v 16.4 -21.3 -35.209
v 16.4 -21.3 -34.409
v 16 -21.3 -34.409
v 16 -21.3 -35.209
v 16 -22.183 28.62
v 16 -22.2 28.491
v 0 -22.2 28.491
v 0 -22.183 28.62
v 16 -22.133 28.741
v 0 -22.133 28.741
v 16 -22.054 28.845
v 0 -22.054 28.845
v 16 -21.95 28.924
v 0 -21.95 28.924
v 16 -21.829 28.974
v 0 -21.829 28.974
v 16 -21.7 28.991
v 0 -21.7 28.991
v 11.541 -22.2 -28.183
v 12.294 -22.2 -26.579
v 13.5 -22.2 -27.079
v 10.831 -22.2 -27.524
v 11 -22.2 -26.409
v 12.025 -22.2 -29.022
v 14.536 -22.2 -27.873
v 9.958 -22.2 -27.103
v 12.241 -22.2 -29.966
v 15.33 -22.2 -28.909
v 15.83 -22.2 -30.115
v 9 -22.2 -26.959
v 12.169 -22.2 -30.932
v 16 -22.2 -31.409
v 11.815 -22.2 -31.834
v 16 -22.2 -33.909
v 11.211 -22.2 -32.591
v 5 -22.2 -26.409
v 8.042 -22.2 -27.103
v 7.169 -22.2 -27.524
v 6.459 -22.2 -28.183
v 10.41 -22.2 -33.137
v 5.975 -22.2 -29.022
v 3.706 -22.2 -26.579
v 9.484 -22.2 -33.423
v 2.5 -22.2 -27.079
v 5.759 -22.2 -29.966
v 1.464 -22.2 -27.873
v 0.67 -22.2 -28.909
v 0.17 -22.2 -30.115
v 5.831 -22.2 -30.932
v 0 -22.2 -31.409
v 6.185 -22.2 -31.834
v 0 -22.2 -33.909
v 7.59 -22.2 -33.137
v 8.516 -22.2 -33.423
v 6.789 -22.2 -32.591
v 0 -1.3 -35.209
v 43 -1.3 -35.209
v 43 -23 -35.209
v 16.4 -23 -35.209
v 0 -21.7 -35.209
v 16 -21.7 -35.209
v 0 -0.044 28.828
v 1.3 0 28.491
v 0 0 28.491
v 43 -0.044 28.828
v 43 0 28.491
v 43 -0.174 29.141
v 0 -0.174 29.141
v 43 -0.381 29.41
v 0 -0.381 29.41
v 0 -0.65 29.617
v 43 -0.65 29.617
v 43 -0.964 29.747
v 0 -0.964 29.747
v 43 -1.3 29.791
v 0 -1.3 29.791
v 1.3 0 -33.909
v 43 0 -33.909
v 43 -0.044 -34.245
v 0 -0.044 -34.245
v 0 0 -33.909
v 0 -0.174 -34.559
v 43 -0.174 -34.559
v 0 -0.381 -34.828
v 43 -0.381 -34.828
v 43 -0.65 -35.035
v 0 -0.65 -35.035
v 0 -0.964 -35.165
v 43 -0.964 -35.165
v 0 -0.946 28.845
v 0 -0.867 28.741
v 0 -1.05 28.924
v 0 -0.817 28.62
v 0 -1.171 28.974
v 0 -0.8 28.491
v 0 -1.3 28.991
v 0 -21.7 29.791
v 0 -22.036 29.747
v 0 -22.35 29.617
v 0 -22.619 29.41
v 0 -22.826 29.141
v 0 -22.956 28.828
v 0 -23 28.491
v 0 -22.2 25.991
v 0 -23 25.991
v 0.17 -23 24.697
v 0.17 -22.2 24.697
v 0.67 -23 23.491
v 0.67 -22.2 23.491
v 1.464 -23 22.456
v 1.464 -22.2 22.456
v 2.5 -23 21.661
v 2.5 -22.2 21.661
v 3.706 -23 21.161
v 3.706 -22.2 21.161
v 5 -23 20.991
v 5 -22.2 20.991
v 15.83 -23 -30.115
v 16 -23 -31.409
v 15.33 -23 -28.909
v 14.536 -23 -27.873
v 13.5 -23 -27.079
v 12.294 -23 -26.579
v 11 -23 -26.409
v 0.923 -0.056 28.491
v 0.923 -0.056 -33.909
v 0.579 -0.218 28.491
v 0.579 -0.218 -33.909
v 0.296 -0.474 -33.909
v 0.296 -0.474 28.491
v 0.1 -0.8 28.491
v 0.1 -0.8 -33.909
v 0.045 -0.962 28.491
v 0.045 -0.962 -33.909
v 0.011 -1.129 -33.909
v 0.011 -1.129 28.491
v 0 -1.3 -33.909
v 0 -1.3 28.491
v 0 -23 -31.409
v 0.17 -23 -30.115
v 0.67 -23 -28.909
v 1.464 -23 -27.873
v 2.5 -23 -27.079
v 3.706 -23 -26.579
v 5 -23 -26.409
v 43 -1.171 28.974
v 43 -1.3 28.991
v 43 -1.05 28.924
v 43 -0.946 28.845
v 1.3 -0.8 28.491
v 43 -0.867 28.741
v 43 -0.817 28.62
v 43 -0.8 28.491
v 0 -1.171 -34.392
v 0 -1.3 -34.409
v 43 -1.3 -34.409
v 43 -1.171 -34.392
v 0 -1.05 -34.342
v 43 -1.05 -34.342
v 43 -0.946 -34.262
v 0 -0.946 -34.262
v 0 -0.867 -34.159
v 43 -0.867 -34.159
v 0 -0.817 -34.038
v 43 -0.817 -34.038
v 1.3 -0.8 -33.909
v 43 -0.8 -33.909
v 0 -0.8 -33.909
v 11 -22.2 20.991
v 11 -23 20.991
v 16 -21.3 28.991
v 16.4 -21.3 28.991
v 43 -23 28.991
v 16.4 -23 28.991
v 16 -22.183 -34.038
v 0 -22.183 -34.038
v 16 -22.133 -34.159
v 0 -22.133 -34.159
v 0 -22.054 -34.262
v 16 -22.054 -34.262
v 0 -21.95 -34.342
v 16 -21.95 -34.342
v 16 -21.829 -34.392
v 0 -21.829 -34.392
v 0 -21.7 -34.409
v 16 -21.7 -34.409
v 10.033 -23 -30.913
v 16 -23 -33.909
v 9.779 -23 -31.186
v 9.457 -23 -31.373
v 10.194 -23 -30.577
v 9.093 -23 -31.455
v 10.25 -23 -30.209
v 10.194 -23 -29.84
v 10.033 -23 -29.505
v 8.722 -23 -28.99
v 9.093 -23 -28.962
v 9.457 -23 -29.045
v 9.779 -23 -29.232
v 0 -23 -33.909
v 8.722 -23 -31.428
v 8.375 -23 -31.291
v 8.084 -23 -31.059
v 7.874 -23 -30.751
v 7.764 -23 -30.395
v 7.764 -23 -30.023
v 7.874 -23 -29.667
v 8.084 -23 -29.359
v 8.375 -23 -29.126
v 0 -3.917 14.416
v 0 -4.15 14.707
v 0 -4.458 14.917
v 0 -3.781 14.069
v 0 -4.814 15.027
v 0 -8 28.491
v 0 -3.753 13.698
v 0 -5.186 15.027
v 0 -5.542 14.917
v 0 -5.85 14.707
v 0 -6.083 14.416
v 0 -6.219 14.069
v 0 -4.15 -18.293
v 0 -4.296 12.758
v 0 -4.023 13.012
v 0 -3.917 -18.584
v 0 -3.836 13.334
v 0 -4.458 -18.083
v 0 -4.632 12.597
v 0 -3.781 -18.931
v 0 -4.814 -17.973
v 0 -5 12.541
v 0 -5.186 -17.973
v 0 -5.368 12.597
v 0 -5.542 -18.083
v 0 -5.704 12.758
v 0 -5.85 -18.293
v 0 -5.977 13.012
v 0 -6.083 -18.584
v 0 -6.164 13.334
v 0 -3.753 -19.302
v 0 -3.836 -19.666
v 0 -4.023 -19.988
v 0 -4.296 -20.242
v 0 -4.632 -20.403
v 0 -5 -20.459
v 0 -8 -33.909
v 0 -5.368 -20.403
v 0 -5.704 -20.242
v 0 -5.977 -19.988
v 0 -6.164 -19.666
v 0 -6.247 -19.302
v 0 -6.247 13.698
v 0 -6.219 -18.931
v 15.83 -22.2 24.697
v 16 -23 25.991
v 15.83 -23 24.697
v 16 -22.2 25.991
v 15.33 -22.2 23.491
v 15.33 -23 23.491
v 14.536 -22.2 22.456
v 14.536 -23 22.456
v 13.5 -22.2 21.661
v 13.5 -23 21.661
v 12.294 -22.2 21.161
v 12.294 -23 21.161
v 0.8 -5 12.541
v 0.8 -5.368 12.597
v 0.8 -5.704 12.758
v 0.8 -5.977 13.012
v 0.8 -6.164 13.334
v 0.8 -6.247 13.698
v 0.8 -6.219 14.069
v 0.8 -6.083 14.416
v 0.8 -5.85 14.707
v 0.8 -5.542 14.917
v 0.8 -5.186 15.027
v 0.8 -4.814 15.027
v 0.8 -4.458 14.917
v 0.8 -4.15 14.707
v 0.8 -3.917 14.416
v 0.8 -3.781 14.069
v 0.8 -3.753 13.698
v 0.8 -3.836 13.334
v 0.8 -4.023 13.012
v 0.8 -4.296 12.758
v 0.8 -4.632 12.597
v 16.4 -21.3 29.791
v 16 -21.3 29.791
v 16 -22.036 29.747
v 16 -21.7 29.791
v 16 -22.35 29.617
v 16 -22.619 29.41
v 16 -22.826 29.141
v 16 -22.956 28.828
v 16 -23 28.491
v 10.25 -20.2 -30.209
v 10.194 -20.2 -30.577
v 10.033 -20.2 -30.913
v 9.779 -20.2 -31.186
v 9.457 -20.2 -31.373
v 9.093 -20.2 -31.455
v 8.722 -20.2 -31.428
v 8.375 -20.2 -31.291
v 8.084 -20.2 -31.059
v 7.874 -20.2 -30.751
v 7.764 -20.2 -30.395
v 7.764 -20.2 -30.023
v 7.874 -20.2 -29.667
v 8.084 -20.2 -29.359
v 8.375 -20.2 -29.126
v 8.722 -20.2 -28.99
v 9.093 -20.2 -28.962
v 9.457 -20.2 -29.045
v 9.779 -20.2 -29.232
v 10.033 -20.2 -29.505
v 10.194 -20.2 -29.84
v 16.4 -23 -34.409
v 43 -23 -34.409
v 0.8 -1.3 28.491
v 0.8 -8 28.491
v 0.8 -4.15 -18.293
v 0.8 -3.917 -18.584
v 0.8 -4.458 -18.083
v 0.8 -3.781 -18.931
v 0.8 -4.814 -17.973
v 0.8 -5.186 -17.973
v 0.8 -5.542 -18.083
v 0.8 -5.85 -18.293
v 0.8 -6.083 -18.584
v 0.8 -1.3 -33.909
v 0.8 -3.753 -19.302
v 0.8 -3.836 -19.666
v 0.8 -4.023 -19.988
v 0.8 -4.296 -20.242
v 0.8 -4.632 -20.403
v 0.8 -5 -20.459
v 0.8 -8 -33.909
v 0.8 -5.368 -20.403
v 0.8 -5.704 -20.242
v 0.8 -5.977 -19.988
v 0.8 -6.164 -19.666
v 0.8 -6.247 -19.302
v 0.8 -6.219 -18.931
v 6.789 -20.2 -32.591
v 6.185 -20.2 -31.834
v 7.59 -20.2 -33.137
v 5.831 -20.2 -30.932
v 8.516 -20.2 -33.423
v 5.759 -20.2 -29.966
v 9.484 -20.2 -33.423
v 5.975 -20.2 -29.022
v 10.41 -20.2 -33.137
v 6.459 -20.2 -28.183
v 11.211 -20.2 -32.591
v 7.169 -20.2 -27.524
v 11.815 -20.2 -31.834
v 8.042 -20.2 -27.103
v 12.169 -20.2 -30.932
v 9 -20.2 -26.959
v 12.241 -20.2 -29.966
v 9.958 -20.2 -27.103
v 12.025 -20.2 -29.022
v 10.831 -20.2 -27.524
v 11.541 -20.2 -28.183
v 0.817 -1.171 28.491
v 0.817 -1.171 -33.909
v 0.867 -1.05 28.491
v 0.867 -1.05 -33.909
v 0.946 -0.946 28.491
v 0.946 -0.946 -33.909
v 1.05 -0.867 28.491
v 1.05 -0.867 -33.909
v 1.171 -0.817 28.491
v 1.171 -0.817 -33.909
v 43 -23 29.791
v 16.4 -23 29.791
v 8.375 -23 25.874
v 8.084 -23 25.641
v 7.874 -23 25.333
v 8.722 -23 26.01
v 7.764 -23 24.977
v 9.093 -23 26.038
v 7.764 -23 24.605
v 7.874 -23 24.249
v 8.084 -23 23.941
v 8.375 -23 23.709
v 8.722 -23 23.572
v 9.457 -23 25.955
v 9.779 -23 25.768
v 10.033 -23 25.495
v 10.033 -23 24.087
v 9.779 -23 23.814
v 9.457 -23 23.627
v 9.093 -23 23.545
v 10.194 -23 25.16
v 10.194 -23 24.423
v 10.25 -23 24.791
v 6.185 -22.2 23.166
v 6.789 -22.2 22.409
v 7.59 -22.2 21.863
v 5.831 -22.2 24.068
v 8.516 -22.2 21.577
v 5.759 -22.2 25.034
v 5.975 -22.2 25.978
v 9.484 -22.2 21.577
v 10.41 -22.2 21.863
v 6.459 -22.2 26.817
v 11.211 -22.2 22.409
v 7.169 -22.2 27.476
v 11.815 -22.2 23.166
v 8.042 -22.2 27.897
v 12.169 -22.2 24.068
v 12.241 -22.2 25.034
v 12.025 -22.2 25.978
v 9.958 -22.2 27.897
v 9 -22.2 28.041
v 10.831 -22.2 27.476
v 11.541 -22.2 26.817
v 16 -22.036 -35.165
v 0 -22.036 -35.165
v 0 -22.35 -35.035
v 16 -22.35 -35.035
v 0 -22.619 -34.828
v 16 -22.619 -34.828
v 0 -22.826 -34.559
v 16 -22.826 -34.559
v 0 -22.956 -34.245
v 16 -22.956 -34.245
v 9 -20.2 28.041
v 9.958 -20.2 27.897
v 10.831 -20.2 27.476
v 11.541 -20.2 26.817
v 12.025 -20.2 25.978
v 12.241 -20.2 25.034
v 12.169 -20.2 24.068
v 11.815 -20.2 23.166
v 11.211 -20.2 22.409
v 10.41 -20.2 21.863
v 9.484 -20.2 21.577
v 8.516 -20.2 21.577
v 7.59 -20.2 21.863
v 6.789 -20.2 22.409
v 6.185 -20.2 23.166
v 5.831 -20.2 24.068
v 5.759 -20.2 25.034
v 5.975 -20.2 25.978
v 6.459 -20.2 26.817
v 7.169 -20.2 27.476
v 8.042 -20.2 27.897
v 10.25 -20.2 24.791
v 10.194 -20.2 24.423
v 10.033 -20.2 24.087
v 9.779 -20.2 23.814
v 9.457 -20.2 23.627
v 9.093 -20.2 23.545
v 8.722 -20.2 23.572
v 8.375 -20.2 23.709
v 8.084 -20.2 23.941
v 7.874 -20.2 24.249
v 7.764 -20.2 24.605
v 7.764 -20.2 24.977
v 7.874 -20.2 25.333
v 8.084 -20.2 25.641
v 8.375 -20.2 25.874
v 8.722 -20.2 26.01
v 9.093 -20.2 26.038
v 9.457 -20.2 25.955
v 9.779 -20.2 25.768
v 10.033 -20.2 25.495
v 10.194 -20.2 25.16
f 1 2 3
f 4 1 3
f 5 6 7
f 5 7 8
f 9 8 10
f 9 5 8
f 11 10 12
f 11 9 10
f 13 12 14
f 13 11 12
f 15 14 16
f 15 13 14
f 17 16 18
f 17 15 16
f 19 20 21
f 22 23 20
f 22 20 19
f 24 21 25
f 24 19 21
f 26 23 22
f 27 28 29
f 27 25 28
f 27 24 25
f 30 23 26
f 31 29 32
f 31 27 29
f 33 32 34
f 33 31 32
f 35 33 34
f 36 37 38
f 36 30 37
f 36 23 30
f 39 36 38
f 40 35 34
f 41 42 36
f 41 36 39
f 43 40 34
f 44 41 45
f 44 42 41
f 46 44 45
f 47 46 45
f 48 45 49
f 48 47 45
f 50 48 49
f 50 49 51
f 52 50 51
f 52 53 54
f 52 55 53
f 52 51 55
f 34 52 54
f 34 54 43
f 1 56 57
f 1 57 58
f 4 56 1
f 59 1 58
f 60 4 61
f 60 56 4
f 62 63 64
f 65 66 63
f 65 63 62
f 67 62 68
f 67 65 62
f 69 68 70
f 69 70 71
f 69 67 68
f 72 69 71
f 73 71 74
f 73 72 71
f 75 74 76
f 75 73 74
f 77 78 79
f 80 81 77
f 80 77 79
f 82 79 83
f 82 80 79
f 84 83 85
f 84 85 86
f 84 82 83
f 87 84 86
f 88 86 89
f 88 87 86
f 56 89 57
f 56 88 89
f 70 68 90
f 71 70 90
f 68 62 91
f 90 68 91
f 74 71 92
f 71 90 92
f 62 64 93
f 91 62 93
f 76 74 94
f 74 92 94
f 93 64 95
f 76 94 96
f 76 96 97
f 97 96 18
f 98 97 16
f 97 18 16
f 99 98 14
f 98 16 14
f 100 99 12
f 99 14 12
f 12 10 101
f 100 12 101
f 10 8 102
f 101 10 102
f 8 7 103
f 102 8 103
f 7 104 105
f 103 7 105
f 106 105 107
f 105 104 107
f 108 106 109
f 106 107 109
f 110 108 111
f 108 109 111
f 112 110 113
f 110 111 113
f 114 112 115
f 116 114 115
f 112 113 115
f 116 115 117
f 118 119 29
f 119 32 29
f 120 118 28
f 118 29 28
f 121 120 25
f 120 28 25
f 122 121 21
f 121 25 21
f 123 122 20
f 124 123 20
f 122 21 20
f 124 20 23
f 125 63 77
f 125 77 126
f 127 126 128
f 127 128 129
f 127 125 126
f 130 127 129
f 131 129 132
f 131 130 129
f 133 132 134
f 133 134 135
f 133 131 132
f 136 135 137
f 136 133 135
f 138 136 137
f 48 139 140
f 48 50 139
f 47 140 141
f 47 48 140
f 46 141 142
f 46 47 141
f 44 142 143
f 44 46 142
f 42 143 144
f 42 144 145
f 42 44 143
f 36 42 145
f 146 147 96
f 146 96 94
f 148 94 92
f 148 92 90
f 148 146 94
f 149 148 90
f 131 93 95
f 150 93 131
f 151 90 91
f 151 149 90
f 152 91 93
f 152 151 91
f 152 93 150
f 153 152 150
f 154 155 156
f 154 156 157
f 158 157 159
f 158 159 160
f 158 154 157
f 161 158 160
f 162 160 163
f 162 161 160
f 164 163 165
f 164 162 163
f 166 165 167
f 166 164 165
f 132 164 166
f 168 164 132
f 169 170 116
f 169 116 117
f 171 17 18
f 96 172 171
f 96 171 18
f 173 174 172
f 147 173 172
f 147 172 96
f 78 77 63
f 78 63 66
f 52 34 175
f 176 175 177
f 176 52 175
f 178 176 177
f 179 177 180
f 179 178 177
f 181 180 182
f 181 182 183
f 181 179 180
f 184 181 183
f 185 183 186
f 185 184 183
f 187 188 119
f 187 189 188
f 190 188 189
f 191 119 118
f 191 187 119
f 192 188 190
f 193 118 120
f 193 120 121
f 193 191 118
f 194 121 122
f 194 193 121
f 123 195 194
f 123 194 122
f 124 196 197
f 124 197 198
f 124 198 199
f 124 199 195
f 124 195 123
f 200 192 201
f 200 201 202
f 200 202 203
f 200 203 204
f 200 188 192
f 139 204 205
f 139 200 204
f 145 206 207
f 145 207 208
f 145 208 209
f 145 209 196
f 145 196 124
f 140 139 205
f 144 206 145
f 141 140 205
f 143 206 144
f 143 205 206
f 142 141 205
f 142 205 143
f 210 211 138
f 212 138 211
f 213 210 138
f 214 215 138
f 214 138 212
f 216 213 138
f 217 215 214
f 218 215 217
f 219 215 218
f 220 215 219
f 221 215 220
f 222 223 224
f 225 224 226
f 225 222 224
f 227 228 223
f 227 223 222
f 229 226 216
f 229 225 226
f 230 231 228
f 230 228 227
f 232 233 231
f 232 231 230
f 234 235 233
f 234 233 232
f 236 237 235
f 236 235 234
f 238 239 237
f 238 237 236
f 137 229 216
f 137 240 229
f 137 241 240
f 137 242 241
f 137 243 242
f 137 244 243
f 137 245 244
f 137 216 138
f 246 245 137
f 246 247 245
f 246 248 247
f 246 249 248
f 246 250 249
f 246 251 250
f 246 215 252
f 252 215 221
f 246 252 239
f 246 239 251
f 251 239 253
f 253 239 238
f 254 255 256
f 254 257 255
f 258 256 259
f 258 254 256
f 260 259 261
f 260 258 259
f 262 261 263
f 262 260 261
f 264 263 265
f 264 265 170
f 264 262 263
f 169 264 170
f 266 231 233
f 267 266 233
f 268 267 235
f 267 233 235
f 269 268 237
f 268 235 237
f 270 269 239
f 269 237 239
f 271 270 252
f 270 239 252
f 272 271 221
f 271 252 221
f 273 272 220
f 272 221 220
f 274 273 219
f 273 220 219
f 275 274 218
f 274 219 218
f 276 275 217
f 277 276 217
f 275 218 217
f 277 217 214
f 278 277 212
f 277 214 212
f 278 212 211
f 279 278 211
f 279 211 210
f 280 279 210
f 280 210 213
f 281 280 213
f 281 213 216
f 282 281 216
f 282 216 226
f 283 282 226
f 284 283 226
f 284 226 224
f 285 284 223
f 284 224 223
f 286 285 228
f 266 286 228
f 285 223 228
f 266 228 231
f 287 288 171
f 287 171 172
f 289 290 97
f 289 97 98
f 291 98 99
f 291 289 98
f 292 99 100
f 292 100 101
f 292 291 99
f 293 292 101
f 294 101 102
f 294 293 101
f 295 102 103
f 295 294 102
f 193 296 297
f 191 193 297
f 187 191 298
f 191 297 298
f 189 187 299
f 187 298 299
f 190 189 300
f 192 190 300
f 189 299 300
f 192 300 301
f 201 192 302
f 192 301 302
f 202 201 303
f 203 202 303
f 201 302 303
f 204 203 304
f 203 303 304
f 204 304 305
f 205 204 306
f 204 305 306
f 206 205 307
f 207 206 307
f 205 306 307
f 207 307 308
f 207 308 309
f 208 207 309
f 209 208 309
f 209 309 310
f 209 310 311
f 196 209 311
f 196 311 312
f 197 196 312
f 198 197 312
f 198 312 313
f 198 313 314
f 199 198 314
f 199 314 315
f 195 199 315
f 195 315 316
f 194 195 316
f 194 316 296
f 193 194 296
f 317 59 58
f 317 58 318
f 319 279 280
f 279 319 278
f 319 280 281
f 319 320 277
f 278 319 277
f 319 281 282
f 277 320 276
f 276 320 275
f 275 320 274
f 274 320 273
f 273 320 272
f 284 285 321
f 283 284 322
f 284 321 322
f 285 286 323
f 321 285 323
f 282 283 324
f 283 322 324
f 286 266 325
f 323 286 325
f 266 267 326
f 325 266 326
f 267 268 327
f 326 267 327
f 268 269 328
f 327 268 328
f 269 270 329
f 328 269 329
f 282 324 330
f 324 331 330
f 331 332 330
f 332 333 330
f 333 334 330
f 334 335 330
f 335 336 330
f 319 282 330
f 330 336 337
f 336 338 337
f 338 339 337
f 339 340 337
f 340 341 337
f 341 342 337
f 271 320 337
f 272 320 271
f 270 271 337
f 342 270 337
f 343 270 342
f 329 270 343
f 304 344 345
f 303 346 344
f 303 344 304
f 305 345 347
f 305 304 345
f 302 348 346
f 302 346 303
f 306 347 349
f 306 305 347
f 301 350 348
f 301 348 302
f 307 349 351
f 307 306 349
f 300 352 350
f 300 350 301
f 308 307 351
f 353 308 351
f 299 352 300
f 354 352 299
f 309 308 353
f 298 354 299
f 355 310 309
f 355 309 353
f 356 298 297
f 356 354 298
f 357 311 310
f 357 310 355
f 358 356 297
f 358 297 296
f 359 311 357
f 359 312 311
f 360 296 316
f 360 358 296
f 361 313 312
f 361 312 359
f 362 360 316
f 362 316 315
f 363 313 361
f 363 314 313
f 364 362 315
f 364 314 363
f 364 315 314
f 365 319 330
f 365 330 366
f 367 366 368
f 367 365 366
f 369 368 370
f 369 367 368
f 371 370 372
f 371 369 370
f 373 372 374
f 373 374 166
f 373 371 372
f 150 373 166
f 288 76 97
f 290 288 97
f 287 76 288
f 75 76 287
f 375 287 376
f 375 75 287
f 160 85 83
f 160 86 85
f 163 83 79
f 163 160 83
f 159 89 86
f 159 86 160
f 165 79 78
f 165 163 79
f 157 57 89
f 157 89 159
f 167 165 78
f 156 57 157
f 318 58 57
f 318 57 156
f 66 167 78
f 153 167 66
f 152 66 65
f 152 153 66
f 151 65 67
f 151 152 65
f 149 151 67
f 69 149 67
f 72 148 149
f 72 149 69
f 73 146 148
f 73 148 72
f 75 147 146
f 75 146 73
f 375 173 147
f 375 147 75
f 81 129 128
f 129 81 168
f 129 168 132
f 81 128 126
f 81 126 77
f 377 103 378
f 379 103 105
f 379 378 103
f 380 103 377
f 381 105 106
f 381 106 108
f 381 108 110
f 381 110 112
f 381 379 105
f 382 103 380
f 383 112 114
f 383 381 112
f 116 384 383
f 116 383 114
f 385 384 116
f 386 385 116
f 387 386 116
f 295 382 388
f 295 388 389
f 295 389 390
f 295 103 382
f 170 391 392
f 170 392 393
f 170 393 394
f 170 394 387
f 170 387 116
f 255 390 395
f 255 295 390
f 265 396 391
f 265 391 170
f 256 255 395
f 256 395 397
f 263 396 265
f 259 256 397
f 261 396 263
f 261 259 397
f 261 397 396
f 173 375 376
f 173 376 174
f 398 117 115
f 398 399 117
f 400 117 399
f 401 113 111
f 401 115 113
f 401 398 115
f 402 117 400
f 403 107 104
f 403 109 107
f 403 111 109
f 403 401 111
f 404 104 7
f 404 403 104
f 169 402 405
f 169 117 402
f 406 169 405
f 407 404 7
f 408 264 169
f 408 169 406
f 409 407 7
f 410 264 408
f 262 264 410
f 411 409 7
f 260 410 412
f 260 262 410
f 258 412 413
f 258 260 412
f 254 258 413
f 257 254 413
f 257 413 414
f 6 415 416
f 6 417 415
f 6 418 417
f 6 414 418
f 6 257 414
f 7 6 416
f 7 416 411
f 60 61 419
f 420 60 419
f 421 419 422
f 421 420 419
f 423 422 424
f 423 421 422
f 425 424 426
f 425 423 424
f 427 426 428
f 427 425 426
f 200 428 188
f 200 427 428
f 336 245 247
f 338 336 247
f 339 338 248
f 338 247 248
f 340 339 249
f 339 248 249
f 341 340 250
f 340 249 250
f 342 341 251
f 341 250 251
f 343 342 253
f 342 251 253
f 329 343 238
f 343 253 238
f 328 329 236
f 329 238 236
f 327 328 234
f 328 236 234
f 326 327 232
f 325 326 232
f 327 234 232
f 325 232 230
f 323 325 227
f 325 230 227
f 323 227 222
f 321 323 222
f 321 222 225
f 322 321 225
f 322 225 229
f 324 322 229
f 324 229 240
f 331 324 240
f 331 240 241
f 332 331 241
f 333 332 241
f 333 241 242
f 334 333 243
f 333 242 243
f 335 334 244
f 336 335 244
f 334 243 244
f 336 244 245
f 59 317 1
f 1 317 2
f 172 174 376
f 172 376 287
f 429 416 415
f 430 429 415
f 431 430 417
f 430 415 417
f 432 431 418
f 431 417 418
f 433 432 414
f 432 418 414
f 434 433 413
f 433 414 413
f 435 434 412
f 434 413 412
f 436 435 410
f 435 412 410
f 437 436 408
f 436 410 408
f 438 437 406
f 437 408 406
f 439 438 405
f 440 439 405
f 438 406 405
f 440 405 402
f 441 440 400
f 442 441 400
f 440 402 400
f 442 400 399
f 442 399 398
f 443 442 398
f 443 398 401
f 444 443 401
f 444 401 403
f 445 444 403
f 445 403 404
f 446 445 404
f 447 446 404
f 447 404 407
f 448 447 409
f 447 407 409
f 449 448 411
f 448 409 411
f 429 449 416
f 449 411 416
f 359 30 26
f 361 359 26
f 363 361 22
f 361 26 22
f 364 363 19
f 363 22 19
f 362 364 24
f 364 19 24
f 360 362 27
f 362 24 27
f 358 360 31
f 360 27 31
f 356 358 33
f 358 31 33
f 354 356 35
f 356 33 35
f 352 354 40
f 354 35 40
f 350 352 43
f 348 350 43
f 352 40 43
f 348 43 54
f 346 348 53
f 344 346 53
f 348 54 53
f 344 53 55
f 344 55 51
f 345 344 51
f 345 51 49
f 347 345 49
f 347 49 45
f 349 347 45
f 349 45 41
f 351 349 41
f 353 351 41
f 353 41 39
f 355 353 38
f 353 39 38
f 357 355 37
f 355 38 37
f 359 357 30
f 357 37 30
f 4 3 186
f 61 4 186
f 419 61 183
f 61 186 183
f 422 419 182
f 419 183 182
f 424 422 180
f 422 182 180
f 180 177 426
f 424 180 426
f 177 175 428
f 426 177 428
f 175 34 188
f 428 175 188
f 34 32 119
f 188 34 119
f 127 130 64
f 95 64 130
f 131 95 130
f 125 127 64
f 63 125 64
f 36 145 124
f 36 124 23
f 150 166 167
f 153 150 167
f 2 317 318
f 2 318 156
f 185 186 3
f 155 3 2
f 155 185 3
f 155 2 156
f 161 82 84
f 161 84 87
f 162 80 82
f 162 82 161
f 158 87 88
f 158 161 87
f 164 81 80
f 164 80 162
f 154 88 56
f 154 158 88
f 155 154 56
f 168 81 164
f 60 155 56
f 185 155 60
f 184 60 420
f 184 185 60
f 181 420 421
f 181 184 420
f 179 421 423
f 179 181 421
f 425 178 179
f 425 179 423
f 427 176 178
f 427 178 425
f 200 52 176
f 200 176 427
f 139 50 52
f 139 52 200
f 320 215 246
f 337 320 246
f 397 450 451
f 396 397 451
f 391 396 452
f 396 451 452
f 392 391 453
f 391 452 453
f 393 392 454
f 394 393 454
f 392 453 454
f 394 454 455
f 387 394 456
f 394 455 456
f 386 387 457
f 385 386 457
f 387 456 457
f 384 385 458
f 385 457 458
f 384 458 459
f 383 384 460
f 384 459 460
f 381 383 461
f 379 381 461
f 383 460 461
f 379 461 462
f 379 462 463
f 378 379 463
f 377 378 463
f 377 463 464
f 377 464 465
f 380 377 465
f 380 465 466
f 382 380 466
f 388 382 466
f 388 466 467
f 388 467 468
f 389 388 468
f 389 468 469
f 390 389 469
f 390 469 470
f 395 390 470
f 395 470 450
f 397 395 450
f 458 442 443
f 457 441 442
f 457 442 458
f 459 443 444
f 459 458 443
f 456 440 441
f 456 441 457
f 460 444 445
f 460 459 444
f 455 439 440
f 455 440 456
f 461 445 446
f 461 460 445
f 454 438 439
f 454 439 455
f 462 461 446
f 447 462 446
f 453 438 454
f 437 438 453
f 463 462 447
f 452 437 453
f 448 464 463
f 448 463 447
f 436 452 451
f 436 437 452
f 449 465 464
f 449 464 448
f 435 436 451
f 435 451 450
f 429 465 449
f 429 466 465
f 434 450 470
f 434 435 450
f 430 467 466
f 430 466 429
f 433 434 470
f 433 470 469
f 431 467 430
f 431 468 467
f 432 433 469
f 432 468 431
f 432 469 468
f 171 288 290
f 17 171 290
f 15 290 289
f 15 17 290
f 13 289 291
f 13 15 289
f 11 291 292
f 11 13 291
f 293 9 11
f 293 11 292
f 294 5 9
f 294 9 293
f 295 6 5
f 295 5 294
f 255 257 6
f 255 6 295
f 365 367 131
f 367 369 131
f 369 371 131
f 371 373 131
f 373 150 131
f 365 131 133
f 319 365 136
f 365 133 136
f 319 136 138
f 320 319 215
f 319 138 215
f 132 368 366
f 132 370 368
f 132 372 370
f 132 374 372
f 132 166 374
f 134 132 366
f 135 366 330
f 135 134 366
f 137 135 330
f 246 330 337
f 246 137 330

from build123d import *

# Parameters (mm, degrees)
SKETCH_1_W                          = 43
SKETCH_1_H                          = 65
SM_BASE_FLANGE_1_DEPTH              = 0.8
SM_EDGE_FLANGE_1_STRIP_W            = 4.2
SM_EDGE_FLANGE_1_STRIP_H            = 0.8
SM_EDGE_FLANGE_1_STRIP_CUT_DEPTH    = 43
SM_EDGE_FLANGE_1_STRIP_2_W          = 4.2
SM_EDGE_FLANGE_1_STRIP_2_H          = 0.8
SM_EDGE_FLANGE_1_STRIP_CUT_2_DEPTH  = 43
SM_EDGE_FLANGE_1_DEPTH              = 43
SM_EDGE_FLANGE_1_BEND_DEPTH         = 43
SM_EDGE_FLANGE_2_STRIP_W            = 4.2
SM_EDGE_FLANGE_2_STRIP_H            = 0.8
SM_EDGE_FLANGE_2_STRIP_CUT_DEPTH    = 62.4
SM_EDGE_FLANGE_2_DEPTH              = 62.4
SM_EDGE_FLANGE_2_PROFILE_W          = 62.4
SM_EDGE_FLANGE_2_PROFILE_H          = 6.7
SM_EDGE_FLANGE_2_PROFILE_R          = 1.25
SM_EDGE_FLANGE_2_FLAT_DEPTH         = 0.8
SM_EDGE_FLANGE_3_STRIP_W            = 4.2
SM_EDGE_FLANGE_3_STRIP_H            = 0.8
SM_EDGE_FLANGE_3_STRIP_CUT_DEPTH    = 16
SM_EDGE_FLANGE_3_RELIEF_W           = 4.6
SM_EDGE_FLANGE_3_RELIEF_H           = 0.4
SM_EDGE_FLANGE_3_RELIEF_CUT_DEPTH   = 0.8
SM_EDGE_FLANGE_3_STRIP_2_W          = 4.2
SM_EDGE_FLANGE_3_STRIP_2_H          = 0.8
SM_EDGE_FLANGE_3_STRIP_CUT_2_DEPTH  = 16
SM_EDGE_FLANGE_3_RELIEF_2_W         = 4.6
SM_EDGE_FLANGE_3_RELIEF_2_H         = 0.4
SM_EDGE_FLANGE_3_RELIEF_CUT_2_DEPTH = 0.8
SM_EDGE_FLANGE_3_DEPTH              = 16
SM_EDGE_FLANGE_3_BEND_DEPTH         = 16
SKETCH_25_R                         = 3.25
EXTRUDE_1_DEPTH                     = 2
HOLE_WIZARD_M3_1_D                  = 2.5
HOLE_WIZARD_M3_1_DEPTH              = 2.8
FILLET_3_R                          = 5


# Sheet-metal steps are written as plain solids
with BuildPart() as part:
    # Sketch 1 → 基体-法兰1 (new body)
    with BuildSketch(Plane(origin=(0, 0, 0), x_dir=(1, 0, 0), z_dir=(0, 1, 0))):
        with Locations((21.5, 2.708940216)):
            Rectangle(SKETCH_1_W, SKETCH_1_H)
    extrude(amount=-SM_BASE_FLANGE_1_DEPTH)

    # 边线-法兰1 strip (across the edge) → 边线-法兰1 strip cut (cut)
    with BuildSketch(Plane(origin=(0, -0.8, -35.208940216), x_dir=(0, 0, 1), z_dir=(1, 0, 0))):
        with Locations((-0.8, -0.4)):
            Rectangle(SM_EDGE_FLANGE_1_STRIP_W, SM_EDGE_FLANGE_1_STRIP_H)
    extrude(amount=SM_EDGE_FLANGE_1_STRIP_CUT_DEPTH, mode=Mode.SUBTRACT)

    # 边线-法兰1 strip 2 (across the edge) → 边线-法兰1 strip cut 2 (cut)
    with BuildSketch(Plane(origin=(43, -0.8, 29.791059784), x_dir=(0, 0, -1), z_dir=(-1, 0, 0))):
        with Locations((-0.8, -0.4)):
            Rectangle(SM_EDGE_FLANGE_1_STRIP_2_W, SM_EDGE_FLANGE_1_STRIP_2_H)
    extrude(amount=SM_EDGE_FLANGE_1_STRIP_CUT_2_DEPTH, mode=Mode.SUBTRACT)

    # 边线-法兰1 section (across the edge) → 边线-法兰1 (add)
    with BuildSketch(Plane(origin=(0, -0.8, -35.208940216), x_dir=(0, 0, 1), z_dir=(1, 0, 0))):
        with BuildLine():
            Line((0, 0.5), (0, 22.2))
            Line((0, 22.2), (0.8, 22.2))
            Line((0.8, 22.2), (0.8, 0.5))
            ThreePointArc((0.8, 0.5), (0.946446609, 0.146446609), (1.3, 0))
            Line((1.3, 0), (1.3, -0.8))
            ThreePointArc((1.3, -0.8), (0.380761184, -0.419238816), (0, 0.5))
        make_face()
    extrude(amount=SM_EDGE_FLANGE_1_DEPTH)

    # 边线-法兰1 section 2 (across the edge) → 边线-法兰1 bend (add)
    with BuildSketch(Plane(origin=(43, -0.8, 29.791059784), x_dir=(0, 0, -1), z_dir=(-1, 0, 0))):
        with BuildLine():
            Line((0, 0.5), (0, 22.2))
            Line((0, 22.2), (0.8, 22.2))
            Line((0.8, 22.2), (0.8, 0.5))
            ThreePointArc((0.8, 0.5), (0.946446609, 0.146446609), (1.3, 0))
            Line((1.3, 0), (1.3, -0.8))
            ThreePointArc((1.3, -0.8), (0.380761184, -0.419238816), (0, 0.5))
        make_face()
    extrude(amount=SM_EDGE_FLANGE_1_BEND_DEPTH)

    # 边线-法兰2 strip (across the edge) → 边线-法兰2 strip cut (cut)
    with BuildSketch(Plane(origin=(0, -0.8, 28.491059784), x_dir=(1, 0, 0), z_dir=(0, 0, -1))):
        with Locations((-0.8, -0.4)):
            Rectangle(SM_EDGE_FLANGE_2_STRIP_W, SM_EDGE_FLANGE_2_STRIP_H)
    extrude(amount=SM_EDGE_FLANGE_2_STRIP_CUT_DEPTH, mode=Mode.SUBTRACT)

    # 边线-法兰2 bend section (across the edge) → 边线-法兰2 (add)
    with BuildSketch(Plane(origin=(0, -0.8, 28.491059784), x_dir=(1, 0, 0), z_dir=(0, 0, -1))):
        with BuildLine():
            Line((0, 0.5), (0.8, 0.5))
            ThreePointArc((0.8, 0.5), (0.946446609, 0.146446609), (1.3, 0))
            Line((1.3, 0), (1.3, -0.8))
            ThreePointArc((1.3, -0.8), (0.380761184, -0.419238816), (0, 0.5))
        make_face()
    extrude(amount=SM_EDGE_FLANGE_2_DEPTH)

    # 边线-法兰2 profile (on flange) → 边线-法兰2 flat (add)
    with BuildSketch(Plane(origin=(0, -0.8, 0), x_dir=(0, 0, -1), z_dir=(-1, 0, 0))):
        with Locations((2.708940216, 3.85)):
            Rectangle(SM_EDGE_FLANGE_2_PROFILE_W, SM_EDGE_FLANGE_2_PROFILE_H)
        with Locations((19.208940216, 4.2)):
            Circle(SM_EDGE_FLANGE_2_PROFILE_R, mode=Mode.SUBTRACT)
        with Locations((-13.791059784, 4.2)):
            Circle(SM_EDGE_FLANGE_2_PROFILE_R, mode=Mode.SUBTRACT)
    extrude(amount=-SM_EDGE_FLANGE_2_FLAT_DEPTH)

    # 边线-法兰3 strip (across the edge) → 边线-法兰3 strip cut (cut)
    with BuildSketch(Plane(origin=(0, -23, -34.408940216), x_dir=(0, 1, 0), z_dir=(1, 0, 0))):
        with Locations((-0.8, -0.4)):
            Rectangle(SM_EDGE_FLANGE_3_STRIP_W, SM_EDGE_FLANGE_3_STRIP_H)
    extrude(amount=SM_EDGE_FLANGE_3_STRIP_CUT_DEPTH, mode=Mode.SUBTRACT)

    # 边线-法兰3 relief (on the sheet) → 边线-法兰3 relief cut (cut)
    with BuildSketch(Plane(origin=(0, -21.7, -34.408940216), x_dir=(0, 1, 0), z_dir=(0, 0, 1))):
        with Locations((-1.9, -16.2)):
            Rectangle(SM_EDGE_FLANGE_3_RELIEF_W, SM_EDGE_FLANGE_3_RELIEF_H)
    extrude(amount=-SM_EDGE_FLANGE_3_RELIEF_CUT_DEPTH, mode=Mode.SUBTRACT)

    # 边线-法兰3 strip 2 (across the edge) → 边线-法兰3 strip cut 2 (cut)
    with BuildSketch(Plane(origin=(16, -23, 28.991059784), x_dir=(0, 1, 0), z_dir=(-1, 0, 0))):
        with Locations((-0.8, -0.4)):
            Rectangle(SM_EDGE_FLANGE_3_STRIP_2_W, SM_EDGE_FLANGE_3_STRIP_2_H)
    extrude(amount=SM_EDGE_FLANGE_3_STRIP_CUT_2_DEPTH, mode=Mode.SUBTRACT)

    # 边线-法兰3 relief 2 (on the sheet) → 边线-法兰3 relief cut 2 (cut)
    with BuildSketch(Plane(origin=(16, -21.7, 28.991059784), x_dir=(0, 1, 0), z_dir=(0, 0, -1))):
        with Locations((-1.9, 0.2)):
            Rectangle(SM_EDGE_FLANGE_3_RELIEF_2_W, SM_EDGE_FLANGE_3_RELIEF_2_H)
    extrude(amount=-SM_EDGE_FLANGE_3_RELIEF_CUT_2_DEPTH, mode=Mode.SUBTRACT)

    # 边线-法兰3 section (across the edge) → 边线-法兰3 (add)
    with BuildSketch(Plane(origin=(0, -23, -34.408940216), x_dir=(0, 1, 0), z_dir=(1, 0, 0))):
        with BuildLine():
            Line((0, 0.5), (0, 8))
            Line((0, 8), (0.8, 8))
            Line((0.8, 8), (0.8, 0.5))
            ThreePointArc((0.8, 0.5), (0.946446609, 0.146446609), (1.3, 0))
            Line((1.3, 0), (1.3, -0.8))
            ThreePointArc((1.3, -0.8), (0.380761184, -0.419238816), (0, 0.5))
        make_face()
    extrude(amount=SM_EDGE_FLANGE_3_DEPTH)

    # 边线-法兰3 section 2 (across the edge) → 边线-法兰3 bend (add)
    with BuildSketch(Plane(origin=(16, -23, 28.991059784), x_dir=(0, 1, 0), z_dir=(-1, 0, 0))):
        with BuildLine():
            Line((0, 0.5), (0, 8))
            Line((0, 8), (0.8, 8))
            Line((0.8, 8), (0.8, 0.5))
            ThreePointArc((0.8, 0.5), (0.946446609, 0.146446609), (1.3, 0))
            Line((1.3, 0), (1.3, -0.8))
            ThreePointArc((1.3, -0.8), (0.380761184, -0.419238816), (0, 0.5))
        make_face()
    extrude(amount=SM_EDGE_FLANGE_3_BEND_DEPTH)

    # 草图25 → 凸台-拉伸1 (add)
    with BuildSketch(Plane(origin=(0, -22.2, 0), x_dir=(1, 0, 0), z_dir=(0, 1, 0))):
        with Locations(Location((9, -24.791059784, 0), (0, 0, 270))):
            Circle(SKETCH_25_R)
        with Locations(Location((9, 30.208940216, 0), (0, 0, 270))):
            Circle(SKETCH_25_R)
    extrude(amount=EXTRUDE_1_DEPTH)

    # M3 螺纹孔1
    with Locations(Plane(origin=(0, -23, 0), x_dir=(-1, 0, 0), z_dir=(0, -1, 0))):
        with Locations((-9, -24.791059784), (-9, 30.208940216)):
            Hole(HOLE_WIZARD_M3_1_D / 2, depth=HOLE_WIZARD_M3_1_DEPTH)

    # 圆角3
    fillet_3_edges = [part.edges().sort_by_distance(p)[0] for p in [
        (0, -22.6, -26.408940216),
        (16, -22.6, -26.408940216),
        (16, -22.6, 20.991059784),
        (0, -22.6, 20.991059784),
    ]]
    fillet(fillet_3_edges, radius=FILLET_3_R)


solid = part.part
